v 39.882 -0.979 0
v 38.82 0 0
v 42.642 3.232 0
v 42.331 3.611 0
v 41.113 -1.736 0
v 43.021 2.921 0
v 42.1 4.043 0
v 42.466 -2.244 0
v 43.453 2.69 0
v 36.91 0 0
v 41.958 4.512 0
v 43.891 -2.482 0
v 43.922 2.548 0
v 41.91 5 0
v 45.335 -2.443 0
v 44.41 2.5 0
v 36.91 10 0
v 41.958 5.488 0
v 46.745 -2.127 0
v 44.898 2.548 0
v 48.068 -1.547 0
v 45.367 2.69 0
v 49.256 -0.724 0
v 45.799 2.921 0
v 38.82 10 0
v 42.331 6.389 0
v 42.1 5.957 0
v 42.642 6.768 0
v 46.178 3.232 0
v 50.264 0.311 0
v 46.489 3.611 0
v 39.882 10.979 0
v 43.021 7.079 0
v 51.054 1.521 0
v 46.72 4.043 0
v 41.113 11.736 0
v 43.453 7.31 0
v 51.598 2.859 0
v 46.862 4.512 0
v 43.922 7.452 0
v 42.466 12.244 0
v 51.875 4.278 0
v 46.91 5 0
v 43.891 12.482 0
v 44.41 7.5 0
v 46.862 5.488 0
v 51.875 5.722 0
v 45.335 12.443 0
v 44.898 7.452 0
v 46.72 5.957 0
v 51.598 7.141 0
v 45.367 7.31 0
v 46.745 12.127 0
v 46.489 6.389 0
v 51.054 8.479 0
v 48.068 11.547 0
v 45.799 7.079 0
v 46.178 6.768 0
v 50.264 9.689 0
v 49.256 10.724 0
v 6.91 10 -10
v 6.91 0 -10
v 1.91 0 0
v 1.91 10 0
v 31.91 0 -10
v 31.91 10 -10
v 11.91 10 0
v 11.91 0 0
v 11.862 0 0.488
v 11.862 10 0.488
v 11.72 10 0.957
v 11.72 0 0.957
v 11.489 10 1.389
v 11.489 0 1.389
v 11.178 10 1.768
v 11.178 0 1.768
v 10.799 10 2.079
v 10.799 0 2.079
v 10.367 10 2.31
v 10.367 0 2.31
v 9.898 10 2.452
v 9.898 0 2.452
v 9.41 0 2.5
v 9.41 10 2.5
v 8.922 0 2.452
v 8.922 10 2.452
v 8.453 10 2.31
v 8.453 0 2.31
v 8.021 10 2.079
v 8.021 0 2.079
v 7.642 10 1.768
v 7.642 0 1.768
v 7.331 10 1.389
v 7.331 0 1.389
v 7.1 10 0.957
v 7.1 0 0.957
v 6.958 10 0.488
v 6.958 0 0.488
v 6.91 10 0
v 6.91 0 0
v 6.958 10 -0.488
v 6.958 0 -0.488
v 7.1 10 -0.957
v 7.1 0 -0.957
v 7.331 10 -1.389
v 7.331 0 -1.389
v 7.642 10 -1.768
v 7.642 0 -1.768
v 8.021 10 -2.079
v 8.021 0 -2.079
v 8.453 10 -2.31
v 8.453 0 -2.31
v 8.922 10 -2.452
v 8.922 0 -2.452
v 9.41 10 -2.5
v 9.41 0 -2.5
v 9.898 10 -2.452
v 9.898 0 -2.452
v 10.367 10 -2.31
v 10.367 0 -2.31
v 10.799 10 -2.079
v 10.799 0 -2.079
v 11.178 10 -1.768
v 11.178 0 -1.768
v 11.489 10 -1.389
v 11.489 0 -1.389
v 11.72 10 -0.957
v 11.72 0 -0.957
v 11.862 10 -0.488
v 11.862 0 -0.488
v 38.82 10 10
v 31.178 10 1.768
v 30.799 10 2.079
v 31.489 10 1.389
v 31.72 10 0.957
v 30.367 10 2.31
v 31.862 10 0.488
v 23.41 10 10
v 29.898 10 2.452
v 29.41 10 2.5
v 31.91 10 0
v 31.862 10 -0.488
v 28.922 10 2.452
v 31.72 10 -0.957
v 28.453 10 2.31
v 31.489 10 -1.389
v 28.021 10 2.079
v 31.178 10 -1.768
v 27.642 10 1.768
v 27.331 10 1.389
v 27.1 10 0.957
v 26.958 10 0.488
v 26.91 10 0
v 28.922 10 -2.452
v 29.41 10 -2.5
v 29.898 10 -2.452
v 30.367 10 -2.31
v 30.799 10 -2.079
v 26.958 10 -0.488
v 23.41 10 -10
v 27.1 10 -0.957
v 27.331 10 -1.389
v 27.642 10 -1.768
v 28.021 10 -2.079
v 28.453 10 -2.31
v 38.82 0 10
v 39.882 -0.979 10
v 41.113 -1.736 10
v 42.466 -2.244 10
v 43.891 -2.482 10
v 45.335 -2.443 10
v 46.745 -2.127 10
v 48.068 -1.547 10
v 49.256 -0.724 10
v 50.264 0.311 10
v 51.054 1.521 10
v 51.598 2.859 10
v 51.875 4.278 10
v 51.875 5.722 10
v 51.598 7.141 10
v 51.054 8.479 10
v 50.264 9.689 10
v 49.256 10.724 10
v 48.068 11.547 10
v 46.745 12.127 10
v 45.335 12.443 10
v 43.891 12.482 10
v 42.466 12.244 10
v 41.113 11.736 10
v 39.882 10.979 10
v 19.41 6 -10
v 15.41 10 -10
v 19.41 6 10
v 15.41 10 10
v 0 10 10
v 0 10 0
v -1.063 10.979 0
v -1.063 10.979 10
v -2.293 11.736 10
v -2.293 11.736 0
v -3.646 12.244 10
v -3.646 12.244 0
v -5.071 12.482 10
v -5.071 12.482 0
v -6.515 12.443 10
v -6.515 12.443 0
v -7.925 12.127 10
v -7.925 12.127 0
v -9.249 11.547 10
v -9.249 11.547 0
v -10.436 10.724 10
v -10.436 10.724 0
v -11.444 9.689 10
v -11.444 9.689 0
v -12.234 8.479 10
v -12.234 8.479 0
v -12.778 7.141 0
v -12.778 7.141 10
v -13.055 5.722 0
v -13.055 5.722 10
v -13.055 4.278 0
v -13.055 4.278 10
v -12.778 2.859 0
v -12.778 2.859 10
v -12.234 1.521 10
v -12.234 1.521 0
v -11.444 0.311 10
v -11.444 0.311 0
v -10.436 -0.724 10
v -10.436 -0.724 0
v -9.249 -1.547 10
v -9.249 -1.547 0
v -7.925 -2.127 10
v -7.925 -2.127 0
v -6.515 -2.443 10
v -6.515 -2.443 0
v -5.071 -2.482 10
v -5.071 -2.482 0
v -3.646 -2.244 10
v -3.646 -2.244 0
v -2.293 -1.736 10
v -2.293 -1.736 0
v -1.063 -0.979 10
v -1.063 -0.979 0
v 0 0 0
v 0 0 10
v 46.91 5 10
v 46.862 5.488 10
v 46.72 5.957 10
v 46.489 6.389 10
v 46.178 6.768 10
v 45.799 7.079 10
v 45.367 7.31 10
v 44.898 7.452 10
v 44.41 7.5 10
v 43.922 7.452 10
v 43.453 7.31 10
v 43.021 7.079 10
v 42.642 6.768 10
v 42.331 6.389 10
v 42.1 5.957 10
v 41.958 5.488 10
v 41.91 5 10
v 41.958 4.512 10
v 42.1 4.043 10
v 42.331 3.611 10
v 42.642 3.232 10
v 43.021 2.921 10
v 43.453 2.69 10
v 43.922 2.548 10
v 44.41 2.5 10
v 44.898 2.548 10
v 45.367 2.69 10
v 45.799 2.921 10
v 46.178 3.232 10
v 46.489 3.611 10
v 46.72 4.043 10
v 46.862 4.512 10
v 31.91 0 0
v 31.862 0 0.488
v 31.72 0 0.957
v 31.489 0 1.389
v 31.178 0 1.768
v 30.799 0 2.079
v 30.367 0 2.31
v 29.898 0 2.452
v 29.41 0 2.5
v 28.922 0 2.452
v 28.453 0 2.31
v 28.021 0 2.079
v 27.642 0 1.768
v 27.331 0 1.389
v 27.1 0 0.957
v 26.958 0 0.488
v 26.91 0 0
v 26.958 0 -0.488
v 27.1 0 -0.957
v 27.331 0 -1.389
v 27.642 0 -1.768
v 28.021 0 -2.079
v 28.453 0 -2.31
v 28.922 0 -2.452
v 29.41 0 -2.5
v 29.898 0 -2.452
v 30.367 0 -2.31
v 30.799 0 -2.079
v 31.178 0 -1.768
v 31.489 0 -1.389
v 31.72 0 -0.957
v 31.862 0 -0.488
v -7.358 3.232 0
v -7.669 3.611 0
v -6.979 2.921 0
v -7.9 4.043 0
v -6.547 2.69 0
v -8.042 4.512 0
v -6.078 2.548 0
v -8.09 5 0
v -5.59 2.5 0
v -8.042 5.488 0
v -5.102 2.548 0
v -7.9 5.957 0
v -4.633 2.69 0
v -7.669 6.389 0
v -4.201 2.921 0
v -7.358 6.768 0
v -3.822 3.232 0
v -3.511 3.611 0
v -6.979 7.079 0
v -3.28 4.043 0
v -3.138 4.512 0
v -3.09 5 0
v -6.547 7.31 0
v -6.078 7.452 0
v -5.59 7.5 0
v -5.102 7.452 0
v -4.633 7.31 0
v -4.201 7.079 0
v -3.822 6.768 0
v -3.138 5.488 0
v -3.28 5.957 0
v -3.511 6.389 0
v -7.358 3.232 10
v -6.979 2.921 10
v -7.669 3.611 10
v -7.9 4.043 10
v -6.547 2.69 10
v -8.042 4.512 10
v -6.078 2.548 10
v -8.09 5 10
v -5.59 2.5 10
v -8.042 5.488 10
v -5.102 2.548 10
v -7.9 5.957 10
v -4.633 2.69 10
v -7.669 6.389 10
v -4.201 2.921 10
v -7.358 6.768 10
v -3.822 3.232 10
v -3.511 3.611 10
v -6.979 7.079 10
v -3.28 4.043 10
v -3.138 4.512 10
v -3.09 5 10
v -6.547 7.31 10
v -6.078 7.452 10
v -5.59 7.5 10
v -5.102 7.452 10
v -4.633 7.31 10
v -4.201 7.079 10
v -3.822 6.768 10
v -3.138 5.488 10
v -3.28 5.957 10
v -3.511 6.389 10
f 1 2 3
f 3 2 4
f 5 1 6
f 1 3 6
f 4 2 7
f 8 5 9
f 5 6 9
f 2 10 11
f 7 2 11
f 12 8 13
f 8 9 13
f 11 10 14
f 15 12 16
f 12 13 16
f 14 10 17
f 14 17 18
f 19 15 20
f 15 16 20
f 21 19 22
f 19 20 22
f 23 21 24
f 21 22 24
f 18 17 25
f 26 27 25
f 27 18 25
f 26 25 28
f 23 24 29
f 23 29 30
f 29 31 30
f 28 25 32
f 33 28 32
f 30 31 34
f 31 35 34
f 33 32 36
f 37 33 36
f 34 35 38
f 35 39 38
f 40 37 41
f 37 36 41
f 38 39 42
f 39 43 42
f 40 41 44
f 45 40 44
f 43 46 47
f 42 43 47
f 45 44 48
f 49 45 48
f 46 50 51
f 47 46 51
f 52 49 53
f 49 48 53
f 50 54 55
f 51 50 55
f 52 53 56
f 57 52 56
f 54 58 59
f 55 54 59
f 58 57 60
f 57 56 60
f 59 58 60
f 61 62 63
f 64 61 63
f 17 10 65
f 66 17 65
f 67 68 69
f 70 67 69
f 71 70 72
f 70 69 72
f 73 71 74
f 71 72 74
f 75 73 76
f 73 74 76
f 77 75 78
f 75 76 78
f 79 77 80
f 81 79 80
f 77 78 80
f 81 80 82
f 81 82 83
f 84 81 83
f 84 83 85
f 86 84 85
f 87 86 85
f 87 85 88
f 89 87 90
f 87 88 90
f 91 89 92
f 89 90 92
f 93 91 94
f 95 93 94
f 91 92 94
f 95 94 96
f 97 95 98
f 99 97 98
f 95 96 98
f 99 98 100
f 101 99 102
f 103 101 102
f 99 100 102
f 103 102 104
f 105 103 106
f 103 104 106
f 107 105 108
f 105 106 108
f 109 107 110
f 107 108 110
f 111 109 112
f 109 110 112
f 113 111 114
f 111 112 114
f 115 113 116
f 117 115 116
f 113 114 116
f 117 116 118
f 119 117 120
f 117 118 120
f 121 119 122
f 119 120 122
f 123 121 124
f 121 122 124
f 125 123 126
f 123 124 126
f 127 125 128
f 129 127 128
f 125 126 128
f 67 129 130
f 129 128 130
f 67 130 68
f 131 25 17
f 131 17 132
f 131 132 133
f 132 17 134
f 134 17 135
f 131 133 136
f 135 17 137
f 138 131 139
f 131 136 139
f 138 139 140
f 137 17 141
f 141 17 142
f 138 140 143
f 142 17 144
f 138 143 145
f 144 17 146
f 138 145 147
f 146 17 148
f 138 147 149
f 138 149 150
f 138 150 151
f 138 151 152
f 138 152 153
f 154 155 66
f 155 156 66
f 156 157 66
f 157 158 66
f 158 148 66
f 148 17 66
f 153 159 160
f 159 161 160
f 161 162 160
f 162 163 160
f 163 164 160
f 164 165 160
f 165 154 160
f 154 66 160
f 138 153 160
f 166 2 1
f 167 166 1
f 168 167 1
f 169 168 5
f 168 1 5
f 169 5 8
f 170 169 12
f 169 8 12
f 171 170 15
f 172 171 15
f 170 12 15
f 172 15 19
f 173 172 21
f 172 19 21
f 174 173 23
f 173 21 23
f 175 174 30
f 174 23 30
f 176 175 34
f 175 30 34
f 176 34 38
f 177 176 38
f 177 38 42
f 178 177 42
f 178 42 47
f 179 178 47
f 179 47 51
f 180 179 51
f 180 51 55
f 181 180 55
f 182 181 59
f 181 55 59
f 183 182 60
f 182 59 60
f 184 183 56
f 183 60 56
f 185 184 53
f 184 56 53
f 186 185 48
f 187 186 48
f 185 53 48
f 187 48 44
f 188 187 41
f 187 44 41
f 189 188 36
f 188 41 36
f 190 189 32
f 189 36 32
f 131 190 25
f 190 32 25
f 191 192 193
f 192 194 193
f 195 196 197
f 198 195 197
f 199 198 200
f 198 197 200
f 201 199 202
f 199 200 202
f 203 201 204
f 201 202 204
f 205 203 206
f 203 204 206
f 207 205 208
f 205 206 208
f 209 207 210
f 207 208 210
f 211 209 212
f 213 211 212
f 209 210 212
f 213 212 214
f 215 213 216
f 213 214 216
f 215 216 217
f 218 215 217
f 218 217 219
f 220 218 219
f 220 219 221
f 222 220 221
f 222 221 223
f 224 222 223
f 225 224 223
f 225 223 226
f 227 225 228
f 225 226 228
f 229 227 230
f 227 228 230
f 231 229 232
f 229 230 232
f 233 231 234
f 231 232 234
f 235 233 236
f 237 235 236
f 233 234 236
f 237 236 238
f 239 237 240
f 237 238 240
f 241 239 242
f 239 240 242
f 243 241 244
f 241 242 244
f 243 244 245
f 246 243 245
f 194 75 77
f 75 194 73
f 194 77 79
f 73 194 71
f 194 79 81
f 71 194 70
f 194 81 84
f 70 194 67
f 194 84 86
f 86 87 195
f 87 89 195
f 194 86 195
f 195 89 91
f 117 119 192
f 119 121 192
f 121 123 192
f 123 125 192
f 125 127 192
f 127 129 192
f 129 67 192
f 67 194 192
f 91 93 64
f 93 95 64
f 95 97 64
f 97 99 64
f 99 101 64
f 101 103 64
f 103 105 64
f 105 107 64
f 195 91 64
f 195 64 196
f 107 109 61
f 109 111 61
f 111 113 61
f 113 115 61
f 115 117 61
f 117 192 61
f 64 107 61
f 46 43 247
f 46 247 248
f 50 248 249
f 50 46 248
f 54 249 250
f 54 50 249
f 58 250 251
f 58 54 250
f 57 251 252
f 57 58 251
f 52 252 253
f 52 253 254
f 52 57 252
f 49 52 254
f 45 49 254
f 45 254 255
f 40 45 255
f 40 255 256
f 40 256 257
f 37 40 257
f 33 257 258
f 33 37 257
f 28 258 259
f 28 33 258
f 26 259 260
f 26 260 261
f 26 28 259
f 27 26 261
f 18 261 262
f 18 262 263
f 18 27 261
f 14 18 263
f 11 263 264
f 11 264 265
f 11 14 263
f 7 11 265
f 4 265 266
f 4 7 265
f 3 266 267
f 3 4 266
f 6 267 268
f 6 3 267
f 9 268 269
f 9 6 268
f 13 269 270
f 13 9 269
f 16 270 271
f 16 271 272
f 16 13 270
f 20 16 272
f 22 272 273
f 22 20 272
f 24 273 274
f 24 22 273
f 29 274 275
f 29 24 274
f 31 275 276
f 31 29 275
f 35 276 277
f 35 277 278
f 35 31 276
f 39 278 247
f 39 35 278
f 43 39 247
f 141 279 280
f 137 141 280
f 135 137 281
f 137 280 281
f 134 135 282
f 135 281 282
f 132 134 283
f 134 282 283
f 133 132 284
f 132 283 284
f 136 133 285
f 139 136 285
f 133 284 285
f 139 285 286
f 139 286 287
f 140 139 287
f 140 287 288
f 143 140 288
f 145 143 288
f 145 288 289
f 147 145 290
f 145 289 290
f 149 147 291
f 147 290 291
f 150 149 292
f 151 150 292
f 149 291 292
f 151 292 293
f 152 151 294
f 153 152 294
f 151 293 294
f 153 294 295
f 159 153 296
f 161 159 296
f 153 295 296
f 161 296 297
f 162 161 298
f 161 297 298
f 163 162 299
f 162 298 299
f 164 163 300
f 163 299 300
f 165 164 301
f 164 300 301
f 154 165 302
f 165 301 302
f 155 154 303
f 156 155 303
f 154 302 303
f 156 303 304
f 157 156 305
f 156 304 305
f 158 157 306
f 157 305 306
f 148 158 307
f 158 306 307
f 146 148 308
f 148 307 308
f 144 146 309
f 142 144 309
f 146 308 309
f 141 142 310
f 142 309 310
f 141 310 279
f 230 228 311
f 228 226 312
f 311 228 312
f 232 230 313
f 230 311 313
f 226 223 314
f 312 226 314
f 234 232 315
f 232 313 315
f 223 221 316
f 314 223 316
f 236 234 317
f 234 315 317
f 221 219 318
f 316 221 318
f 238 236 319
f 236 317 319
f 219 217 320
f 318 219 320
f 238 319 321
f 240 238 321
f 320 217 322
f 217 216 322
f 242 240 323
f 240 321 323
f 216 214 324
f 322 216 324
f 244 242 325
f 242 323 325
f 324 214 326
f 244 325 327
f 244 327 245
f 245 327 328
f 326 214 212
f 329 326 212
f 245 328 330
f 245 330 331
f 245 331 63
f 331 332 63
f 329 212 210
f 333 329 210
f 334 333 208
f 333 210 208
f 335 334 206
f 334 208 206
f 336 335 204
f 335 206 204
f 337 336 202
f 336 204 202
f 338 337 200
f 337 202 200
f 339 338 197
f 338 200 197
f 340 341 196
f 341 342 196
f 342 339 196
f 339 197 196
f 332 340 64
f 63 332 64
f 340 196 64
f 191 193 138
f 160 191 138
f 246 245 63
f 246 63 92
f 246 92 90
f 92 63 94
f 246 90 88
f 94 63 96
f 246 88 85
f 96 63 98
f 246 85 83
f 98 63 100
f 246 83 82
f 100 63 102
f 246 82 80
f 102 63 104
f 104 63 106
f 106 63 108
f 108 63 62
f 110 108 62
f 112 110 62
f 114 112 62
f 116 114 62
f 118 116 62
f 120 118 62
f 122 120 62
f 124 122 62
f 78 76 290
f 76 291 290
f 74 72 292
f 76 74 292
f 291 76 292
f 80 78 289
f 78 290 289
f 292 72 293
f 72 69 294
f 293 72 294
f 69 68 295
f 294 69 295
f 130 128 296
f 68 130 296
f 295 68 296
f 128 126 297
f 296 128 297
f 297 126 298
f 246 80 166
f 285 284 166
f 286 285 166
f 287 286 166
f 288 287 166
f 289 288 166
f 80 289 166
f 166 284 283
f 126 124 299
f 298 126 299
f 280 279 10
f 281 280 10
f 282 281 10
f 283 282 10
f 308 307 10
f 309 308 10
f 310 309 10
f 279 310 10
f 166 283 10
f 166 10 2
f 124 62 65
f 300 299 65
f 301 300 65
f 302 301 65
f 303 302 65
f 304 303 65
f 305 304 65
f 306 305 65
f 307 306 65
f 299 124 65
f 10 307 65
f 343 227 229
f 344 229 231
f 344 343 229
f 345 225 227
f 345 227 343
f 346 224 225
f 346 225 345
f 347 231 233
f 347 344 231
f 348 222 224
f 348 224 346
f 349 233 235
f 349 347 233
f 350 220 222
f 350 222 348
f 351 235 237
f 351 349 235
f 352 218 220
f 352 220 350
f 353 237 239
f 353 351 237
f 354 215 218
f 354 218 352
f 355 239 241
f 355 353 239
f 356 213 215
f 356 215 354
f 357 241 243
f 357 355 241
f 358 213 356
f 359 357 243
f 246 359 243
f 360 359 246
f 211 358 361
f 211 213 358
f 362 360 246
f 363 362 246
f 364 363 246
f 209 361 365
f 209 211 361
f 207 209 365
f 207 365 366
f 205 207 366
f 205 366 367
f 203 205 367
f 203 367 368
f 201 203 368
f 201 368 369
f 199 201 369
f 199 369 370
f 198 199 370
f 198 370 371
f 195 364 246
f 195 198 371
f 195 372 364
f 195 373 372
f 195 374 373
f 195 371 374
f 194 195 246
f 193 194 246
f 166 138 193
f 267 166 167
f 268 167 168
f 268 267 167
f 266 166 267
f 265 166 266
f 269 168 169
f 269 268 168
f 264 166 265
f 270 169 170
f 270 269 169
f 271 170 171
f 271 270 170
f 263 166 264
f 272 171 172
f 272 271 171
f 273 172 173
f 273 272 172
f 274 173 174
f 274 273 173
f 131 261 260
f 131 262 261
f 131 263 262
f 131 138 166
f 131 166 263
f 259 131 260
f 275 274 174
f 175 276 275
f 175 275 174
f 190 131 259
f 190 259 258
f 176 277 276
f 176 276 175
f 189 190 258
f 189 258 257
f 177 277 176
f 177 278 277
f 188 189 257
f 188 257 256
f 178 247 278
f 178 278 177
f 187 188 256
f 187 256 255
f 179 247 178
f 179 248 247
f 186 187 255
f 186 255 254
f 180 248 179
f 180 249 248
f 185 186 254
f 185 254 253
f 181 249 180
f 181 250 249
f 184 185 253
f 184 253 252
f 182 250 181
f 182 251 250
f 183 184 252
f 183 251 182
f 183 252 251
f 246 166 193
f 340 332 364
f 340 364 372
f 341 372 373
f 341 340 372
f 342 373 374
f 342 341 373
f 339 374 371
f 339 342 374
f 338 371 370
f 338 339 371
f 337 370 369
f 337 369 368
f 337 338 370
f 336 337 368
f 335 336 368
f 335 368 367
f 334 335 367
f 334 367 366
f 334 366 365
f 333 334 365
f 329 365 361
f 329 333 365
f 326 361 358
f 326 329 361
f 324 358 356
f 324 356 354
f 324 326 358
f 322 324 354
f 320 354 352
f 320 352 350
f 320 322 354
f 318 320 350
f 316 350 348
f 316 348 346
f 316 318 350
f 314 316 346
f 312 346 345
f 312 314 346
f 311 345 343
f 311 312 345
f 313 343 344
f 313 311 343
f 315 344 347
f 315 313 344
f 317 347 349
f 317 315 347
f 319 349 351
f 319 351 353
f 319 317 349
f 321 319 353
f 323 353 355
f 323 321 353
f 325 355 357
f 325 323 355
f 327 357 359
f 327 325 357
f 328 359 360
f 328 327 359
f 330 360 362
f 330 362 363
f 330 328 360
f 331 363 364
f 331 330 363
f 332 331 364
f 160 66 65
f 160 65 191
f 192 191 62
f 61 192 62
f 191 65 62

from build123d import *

# Parameters (mm, degrees)
SKETCH003_R      = 2.5
EXTRUDE003_DEPTH = 10
EXTRUDE002_DEPTH = 10
EXTRUDE001_DEPTH = 10
SKETCH_R         = 2.5
EXTRUDE_DEPTH    = 10


with BuildPart() as extrude003:
    # Sketch003 (on Cut) → Extrude003 (new body)
    with BuildSketch(Plane.XZ):
        with Locations((9.41, 0)):
            Circle(SKETCH003_R)
        with Locations((29.41, 0)):
            Circle(SKETCH003_R)
    extrude(amount=-EXTRUDE003_DEPTH)


with BuildPart() as extrude002:
    # Sketch002 (on Fusion) → Extrude002 (new body, symmetric)
    with BuildSketch(Plane(origin=(0, 10, 0), x_dir=(1, 0, 0), z_dir=(0, 0, 1))):
        Polygon((15.41, 0), (19.41, -4), (23.41, 0), align=None)
    extrude(amount=EXTRUDE002_DEPTH, both=True)


with BuildPart() as extrude001:
    # Sketch001 (on Extrude) → Extrude001 (new body)
    with BuildSketch(Plane.XZ):
        Polygon((1.91, 0), (36.91, 0), (31.91, -10), (6.91, -10), align=None)
    extrude(amount=-EXTRUDE001_DEPTH)


with BuildPart() as cut001:
    # Sketch → Extrude (new body)
    with BuildSketch(Plane.XY):
        with BuildLine():
            Line((0, 0), (38.81966, 0))
            ThreePointArc((38.81966, 0), (51.90983, 5), (38.81966, 10))
            Line((38.81966, 10), (0, 10))
            ThreePointArc((0, 10), (-13.09017, 5), (0, 0))
        make_face()
        with Locations((-5.59017, 5)):
            Circle(SKETCH_R, mode=Mode.SUBTRACT)
        with Locations((44.40983, 5)):
            Circle(SKETCH_R, mode=Mode.SUBTRACT)
    extrude(amount=EXTRUDE_DEPTH)

    # Fusion: union Extrude001
    add(extrude001.part)

    # Cut: cut Extrude002
    add(extrude002.part, mode=Mode.SUBTRACT)

    # Cut001: cut Extrude003
    add(extrude003.part, mode=Mode.SUBTRACT)


solid = cut001.part
